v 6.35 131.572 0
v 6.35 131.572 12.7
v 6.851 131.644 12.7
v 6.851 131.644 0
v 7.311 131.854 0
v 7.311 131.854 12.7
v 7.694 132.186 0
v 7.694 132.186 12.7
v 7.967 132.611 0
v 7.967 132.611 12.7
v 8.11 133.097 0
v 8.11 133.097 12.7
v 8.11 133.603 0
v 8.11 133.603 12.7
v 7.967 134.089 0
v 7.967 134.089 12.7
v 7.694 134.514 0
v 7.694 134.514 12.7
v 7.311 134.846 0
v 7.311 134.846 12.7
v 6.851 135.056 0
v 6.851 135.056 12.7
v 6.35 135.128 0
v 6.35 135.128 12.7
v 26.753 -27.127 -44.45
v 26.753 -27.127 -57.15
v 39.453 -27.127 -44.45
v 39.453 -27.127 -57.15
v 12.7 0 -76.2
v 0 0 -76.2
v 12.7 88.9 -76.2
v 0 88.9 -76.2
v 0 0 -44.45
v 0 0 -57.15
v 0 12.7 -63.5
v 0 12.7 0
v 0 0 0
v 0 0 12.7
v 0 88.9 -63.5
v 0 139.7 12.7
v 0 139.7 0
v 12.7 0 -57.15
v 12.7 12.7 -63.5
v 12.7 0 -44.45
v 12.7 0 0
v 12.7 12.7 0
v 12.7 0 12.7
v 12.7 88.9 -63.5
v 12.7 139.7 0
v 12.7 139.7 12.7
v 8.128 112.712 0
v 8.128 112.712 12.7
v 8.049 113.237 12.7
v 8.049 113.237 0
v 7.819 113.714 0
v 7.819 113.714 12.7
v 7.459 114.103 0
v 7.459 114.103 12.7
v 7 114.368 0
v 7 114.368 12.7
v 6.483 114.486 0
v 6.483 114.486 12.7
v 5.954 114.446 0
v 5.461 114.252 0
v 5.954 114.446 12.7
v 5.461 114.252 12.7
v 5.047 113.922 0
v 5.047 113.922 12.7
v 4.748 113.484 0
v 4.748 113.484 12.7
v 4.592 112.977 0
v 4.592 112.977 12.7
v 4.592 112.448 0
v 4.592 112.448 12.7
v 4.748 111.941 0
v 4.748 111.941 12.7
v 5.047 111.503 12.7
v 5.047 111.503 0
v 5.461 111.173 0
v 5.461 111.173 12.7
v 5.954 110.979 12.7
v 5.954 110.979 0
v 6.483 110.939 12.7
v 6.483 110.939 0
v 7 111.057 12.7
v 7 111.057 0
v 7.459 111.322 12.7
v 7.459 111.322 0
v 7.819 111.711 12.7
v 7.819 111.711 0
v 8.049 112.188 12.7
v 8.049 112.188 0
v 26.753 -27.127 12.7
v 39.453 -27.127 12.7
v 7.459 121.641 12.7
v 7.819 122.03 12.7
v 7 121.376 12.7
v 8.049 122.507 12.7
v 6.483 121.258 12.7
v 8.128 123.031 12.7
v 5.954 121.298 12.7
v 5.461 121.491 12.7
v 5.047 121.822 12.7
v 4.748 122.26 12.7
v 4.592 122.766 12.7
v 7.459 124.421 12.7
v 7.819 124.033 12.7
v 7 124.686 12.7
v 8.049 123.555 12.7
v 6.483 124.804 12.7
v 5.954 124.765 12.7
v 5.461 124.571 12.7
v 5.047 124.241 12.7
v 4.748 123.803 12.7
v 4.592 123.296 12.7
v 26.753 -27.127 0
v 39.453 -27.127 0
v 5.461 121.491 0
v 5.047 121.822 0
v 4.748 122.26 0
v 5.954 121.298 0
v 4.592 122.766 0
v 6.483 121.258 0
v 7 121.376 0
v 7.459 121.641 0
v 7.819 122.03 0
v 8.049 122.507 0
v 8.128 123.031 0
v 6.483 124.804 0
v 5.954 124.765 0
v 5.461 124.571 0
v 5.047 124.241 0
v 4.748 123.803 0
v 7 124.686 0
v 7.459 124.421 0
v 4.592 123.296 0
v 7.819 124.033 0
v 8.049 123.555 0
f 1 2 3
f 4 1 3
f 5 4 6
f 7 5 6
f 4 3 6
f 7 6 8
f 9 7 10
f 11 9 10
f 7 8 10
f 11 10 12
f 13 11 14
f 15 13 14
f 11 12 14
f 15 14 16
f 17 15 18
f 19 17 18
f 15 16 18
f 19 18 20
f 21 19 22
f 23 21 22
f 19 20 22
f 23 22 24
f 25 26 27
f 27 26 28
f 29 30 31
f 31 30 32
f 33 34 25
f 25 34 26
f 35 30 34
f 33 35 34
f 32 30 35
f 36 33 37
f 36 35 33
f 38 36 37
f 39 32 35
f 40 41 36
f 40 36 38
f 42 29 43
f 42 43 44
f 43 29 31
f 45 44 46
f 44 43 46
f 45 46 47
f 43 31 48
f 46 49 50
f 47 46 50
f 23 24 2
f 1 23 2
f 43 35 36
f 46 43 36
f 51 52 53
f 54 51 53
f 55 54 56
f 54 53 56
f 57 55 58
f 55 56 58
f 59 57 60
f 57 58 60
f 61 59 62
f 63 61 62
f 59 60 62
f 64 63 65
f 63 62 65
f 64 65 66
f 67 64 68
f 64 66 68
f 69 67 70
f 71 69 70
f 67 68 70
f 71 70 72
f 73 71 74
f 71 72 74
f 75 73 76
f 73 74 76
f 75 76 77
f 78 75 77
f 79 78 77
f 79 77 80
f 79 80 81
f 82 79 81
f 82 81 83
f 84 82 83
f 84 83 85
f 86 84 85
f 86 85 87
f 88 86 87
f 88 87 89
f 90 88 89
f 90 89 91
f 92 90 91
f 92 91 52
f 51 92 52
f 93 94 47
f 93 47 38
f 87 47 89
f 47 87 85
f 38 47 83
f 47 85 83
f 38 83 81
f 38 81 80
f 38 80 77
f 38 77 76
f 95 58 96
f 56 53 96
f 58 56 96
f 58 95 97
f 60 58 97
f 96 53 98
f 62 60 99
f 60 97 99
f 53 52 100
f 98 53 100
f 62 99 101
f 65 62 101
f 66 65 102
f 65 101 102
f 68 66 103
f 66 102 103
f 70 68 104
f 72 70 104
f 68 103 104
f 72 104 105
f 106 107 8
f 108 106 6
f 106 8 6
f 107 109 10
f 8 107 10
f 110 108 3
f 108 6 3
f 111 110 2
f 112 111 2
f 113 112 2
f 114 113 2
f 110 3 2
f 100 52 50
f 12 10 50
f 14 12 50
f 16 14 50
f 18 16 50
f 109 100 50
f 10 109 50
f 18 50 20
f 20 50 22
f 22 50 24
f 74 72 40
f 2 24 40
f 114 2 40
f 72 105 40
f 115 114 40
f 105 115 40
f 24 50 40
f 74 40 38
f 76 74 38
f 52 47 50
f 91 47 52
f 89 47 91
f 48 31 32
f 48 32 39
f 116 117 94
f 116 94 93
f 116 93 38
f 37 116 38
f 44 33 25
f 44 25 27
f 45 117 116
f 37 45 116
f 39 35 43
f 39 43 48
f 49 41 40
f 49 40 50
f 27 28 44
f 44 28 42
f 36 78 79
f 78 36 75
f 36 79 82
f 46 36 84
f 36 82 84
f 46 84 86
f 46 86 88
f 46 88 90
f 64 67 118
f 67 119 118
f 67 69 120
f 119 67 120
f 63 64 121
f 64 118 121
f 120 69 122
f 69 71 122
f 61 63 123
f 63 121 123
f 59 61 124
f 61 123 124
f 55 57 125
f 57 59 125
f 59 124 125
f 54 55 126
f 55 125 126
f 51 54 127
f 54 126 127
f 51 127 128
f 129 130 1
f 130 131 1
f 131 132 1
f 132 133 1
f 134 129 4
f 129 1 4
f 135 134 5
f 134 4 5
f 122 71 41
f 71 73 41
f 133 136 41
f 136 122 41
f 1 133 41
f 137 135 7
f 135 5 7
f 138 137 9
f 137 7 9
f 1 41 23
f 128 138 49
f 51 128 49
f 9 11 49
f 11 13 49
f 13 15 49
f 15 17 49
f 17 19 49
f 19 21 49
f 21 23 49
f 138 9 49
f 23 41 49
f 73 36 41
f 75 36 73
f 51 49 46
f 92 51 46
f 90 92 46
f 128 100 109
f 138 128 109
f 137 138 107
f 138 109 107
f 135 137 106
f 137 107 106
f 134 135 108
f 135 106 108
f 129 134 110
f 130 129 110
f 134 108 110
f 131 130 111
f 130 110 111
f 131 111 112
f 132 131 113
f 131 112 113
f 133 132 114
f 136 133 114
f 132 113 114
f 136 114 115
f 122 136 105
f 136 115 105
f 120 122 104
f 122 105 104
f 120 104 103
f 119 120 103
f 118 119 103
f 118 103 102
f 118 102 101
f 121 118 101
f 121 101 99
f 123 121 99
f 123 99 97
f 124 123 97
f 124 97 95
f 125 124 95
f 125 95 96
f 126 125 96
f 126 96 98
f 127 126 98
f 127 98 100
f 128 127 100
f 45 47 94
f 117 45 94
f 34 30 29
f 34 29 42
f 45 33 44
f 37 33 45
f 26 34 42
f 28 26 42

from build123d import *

# Parameters (mm, degrees)
SKETCH1_W           = 12.7
SKETCH1_H           = 139.7
BOSS_EXTRUDE1_DEPTH = 12.7
SKETCH2_W           = 63.5
SKETCH2_H           = 12.7
BOSS_EXTRUDE2_DEPTH = 12.7
SKETCH3_W           = 12.7
SKETCH3_H           = 88.9
BOSS_EXTRUDE3_DEPTH = 12.7
BOSS_EXTRUDE5_DEPTH = 12.7
BOSS_EXTRUDE6_START = -19.05
BOSS_EXTRUDE6_DEPTH = 12.7
SKETCH6_R           = 1.778
CUT_EXTRUDE1_DEPTH  = 89.9


with BuildPart() as part:
    # Sketch1 → Boss-Extrude1 (new body)
    with BuildSketch(Plane.XY):
        with Locations((6.35, 69.85)):
            Rectangle(SKETCH1_W, SKETCH1_H)
    extrude(amount=BOSS_EXTRUDE1_DEPTH)

    # Sketch2 → Boss-Extrude2 (add)
    with BuildSketch(Plane.ZY):
        with Locations((-31.75, 6.35)):
            Rectangle(SKETCH2_W, SKETCH2_H)
    extrude(amount=-BOSS_EXTRUDE2_DEPTH)

    # Sketch3 → Boss-Extrude3 (add)
    with BuildSketch(Plane.ZY):
        with Locations((-69.85, 44.45)):
            Rectangle(SKETCH3_W, SKETCH3_H)
    extrude(amount=-BOSS_EXTRUDE3_DEPTH)

    # Sketch4 → Boss-Extrude5 (add)
    with BuildSketch(Plane.XY.offset(12.7)):
        Polygon((12.7, 0), (39.453062828, -27.127175108), (26.753062828, -27.127175108), (0, 0), align=None)
    extrude(amount=-BOSS_EXTRUDE5_DEPTH)

    # Sketch5 → Boss-Extrude6 (add)
    with BuildSketch(Plane(origin=(0, 0, -76.2), x_dir=(-1, 0, 0), z_dir=(0, 0, -1)).offset(BOSS_EXTRUDE6_START)):
        Polygon((0, 0), (-26.753062828, -27.127175108), (-39.453062828, -27.127175108), (-12.7, 0), align=None)
    extrude(amount=-BOSS_EXTRUDE6_DEPTH)

    # Sketch6 → Cut-Extrude1 (cut, through all)
    with BuildSketch(Plane.XY.offset(12.7)):
        with BuildLine():
            ThreePointArc((6.35, 131.572), (8.128, 133.35), (6.35, 135.128))
            Line((6.35, 135.128), (6.35, 131.572))
        make_face()
        with Locations((6.35, 112.7125)):
            Circle(SKETCH6_R)
        with Locations((6.35, 123.03125)):
            Circle(SKETCH6_R)
    extrude(amount=-CUT_EXTRUDE1_DEPTH, mode=Mode.SUBTRACT)


solid = part.part
